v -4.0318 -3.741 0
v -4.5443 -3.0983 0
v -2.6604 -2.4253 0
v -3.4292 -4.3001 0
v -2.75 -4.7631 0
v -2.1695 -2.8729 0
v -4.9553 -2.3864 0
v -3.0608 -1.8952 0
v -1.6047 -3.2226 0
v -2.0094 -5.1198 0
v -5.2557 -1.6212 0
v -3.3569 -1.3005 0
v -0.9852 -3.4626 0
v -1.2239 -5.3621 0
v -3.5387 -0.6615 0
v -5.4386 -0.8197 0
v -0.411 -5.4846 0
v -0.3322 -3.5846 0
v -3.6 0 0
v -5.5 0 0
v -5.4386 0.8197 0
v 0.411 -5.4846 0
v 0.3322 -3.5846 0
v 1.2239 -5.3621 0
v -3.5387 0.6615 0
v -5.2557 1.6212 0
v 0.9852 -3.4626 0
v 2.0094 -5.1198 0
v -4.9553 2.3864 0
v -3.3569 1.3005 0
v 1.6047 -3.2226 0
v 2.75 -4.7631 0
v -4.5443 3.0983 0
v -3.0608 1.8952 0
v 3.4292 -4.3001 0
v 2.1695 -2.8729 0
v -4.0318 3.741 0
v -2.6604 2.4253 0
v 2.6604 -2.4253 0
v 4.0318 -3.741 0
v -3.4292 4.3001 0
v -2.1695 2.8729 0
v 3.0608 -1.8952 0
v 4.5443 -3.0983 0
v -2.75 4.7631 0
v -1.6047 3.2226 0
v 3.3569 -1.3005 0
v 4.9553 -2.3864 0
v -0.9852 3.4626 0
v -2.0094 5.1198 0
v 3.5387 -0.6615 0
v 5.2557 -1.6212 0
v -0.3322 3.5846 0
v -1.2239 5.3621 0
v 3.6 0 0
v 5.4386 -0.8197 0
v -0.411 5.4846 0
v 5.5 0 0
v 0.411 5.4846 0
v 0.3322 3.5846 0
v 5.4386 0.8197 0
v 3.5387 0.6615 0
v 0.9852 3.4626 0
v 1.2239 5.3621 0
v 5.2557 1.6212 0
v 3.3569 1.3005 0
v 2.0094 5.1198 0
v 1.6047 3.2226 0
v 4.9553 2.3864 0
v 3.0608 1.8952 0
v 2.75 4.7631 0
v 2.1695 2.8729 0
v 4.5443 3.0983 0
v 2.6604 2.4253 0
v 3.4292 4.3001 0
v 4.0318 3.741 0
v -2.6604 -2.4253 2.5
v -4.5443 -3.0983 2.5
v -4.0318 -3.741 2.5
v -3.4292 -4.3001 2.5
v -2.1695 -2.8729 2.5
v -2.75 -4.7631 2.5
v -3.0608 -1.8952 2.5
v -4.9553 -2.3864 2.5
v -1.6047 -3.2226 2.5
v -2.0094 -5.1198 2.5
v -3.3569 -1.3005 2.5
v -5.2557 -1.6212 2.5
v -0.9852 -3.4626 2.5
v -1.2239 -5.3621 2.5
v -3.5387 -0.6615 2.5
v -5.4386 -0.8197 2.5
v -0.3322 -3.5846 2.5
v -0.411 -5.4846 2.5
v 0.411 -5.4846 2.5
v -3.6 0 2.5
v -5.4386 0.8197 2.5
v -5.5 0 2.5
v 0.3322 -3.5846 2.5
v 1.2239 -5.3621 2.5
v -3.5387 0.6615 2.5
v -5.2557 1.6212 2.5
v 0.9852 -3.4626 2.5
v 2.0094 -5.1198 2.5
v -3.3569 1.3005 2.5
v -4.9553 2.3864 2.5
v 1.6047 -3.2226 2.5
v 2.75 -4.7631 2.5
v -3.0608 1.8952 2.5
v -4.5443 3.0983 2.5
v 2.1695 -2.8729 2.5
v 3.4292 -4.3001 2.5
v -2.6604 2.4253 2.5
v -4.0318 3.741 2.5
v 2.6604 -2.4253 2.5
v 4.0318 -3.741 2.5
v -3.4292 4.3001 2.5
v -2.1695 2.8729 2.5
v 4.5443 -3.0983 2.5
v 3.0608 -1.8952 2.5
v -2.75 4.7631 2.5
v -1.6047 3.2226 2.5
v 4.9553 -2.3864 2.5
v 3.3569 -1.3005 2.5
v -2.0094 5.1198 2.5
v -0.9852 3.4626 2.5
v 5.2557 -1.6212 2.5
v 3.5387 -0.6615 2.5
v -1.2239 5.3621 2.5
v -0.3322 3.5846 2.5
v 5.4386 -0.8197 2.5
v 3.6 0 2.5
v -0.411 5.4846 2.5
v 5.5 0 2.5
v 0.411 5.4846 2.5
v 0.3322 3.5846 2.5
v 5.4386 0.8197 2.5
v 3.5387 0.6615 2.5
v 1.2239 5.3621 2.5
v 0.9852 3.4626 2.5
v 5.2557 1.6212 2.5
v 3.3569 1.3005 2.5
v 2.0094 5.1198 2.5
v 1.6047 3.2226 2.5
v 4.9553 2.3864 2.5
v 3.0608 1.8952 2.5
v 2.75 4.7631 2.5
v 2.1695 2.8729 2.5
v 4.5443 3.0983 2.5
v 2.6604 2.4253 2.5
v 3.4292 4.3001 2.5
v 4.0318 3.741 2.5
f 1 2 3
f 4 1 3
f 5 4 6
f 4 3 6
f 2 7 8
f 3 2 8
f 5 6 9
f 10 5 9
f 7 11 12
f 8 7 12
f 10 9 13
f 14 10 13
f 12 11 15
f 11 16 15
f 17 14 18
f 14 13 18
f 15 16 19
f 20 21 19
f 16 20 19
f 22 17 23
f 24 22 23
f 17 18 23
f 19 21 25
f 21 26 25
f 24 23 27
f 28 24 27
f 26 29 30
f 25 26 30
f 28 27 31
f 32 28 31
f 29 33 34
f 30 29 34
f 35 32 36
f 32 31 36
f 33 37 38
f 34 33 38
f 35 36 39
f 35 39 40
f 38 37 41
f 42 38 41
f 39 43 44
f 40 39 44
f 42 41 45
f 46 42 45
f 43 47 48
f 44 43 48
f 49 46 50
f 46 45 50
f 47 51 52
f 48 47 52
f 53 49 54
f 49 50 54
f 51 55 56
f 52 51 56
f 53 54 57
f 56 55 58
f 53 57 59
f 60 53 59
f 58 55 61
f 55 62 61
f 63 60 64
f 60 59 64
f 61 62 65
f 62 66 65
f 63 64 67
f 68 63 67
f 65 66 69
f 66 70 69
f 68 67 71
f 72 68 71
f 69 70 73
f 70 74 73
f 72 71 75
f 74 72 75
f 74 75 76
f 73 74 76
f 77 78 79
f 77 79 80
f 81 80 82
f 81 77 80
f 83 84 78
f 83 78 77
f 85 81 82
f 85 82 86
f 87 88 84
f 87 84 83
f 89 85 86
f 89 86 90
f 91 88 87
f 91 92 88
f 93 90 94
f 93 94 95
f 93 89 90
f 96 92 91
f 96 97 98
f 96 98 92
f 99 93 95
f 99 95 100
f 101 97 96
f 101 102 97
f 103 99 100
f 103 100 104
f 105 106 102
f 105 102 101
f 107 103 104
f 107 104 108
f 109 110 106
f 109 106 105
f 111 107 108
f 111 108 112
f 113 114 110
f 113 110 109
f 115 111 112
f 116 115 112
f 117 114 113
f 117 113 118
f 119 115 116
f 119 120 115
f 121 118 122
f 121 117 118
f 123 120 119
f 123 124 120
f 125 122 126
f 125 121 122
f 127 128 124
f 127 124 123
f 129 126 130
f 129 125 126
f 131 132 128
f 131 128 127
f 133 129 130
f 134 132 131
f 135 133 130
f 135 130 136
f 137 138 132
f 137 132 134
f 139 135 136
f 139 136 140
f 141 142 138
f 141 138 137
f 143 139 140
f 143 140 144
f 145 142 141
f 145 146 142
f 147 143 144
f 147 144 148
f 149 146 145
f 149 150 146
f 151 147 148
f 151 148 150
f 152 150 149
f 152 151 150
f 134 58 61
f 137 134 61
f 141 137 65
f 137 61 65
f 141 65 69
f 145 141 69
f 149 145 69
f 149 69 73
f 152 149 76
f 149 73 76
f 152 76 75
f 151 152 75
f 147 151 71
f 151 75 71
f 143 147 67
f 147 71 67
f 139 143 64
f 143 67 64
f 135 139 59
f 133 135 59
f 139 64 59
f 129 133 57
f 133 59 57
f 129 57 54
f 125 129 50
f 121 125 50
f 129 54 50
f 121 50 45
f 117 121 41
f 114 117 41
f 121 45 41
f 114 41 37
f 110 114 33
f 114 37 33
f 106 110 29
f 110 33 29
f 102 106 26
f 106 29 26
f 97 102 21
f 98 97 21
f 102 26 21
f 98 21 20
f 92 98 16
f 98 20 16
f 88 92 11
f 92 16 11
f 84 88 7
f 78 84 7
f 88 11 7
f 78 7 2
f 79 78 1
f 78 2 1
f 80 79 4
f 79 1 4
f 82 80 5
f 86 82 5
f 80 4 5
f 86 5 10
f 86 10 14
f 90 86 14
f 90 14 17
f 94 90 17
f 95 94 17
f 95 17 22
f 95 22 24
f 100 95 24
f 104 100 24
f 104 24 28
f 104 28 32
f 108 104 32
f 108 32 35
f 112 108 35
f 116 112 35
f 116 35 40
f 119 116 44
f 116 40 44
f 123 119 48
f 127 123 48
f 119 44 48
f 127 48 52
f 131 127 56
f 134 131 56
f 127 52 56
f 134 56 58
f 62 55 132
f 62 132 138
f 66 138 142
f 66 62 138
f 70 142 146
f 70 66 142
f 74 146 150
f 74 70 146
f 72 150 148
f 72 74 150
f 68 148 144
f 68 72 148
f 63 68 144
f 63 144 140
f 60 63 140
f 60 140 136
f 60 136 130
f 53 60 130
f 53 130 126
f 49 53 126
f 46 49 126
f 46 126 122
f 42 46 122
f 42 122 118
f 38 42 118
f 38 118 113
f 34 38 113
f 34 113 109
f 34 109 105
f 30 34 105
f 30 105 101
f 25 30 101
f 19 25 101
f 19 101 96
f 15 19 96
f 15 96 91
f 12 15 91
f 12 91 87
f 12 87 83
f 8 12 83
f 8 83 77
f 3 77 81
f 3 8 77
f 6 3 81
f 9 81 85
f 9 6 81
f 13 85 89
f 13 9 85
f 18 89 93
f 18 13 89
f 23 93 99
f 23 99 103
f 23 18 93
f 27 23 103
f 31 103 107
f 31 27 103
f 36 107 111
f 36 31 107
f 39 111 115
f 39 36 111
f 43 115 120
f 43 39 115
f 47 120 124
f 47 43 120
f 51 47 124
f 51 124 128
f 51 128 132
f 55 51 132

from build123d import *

# Parameters (mm, degrees)
F_0172_CYLINDER_SKETCH_R = 5.5
F_0172_CYLINDER_DEPTH    = 2.5
F_0173_CYLINDER_SKETCH_R = 3.6
F_0173_CYLINDER_DEPTH    = 5


with BuildPart() as part:
    # 0172_cylinder_Sketch → 0172_cylinder (new body)
    with BuildSketch(Plane.XY):
        Circle(F_0172_CYLINDER_SKETCH_R)
    extrude(amount=F_0172_CYLINDER_DEPTH)


with BuildPart() as body_2:
    # 0173_cylinder_Sketch → 0173_cylinder (new body)
    with BuildSketch(Plane.XY):
        Circle(F_0173_CYLINDER_SKETCH_R)
    extrude(amount=F_0173_CYLINDER_DEPTH)


with BuildPart() as body_2_1:
    # 0173_cylinder_Translate: moved
    add(body_2.part.moved(Location((0, 0, -2.5))))


with BuildPart() as part_1:
    add(part.part)

    # 0174_sub: cut body 2
    add(body_2_1.part, mode=Mode.SUBTRACT)


solid = part_1.part
